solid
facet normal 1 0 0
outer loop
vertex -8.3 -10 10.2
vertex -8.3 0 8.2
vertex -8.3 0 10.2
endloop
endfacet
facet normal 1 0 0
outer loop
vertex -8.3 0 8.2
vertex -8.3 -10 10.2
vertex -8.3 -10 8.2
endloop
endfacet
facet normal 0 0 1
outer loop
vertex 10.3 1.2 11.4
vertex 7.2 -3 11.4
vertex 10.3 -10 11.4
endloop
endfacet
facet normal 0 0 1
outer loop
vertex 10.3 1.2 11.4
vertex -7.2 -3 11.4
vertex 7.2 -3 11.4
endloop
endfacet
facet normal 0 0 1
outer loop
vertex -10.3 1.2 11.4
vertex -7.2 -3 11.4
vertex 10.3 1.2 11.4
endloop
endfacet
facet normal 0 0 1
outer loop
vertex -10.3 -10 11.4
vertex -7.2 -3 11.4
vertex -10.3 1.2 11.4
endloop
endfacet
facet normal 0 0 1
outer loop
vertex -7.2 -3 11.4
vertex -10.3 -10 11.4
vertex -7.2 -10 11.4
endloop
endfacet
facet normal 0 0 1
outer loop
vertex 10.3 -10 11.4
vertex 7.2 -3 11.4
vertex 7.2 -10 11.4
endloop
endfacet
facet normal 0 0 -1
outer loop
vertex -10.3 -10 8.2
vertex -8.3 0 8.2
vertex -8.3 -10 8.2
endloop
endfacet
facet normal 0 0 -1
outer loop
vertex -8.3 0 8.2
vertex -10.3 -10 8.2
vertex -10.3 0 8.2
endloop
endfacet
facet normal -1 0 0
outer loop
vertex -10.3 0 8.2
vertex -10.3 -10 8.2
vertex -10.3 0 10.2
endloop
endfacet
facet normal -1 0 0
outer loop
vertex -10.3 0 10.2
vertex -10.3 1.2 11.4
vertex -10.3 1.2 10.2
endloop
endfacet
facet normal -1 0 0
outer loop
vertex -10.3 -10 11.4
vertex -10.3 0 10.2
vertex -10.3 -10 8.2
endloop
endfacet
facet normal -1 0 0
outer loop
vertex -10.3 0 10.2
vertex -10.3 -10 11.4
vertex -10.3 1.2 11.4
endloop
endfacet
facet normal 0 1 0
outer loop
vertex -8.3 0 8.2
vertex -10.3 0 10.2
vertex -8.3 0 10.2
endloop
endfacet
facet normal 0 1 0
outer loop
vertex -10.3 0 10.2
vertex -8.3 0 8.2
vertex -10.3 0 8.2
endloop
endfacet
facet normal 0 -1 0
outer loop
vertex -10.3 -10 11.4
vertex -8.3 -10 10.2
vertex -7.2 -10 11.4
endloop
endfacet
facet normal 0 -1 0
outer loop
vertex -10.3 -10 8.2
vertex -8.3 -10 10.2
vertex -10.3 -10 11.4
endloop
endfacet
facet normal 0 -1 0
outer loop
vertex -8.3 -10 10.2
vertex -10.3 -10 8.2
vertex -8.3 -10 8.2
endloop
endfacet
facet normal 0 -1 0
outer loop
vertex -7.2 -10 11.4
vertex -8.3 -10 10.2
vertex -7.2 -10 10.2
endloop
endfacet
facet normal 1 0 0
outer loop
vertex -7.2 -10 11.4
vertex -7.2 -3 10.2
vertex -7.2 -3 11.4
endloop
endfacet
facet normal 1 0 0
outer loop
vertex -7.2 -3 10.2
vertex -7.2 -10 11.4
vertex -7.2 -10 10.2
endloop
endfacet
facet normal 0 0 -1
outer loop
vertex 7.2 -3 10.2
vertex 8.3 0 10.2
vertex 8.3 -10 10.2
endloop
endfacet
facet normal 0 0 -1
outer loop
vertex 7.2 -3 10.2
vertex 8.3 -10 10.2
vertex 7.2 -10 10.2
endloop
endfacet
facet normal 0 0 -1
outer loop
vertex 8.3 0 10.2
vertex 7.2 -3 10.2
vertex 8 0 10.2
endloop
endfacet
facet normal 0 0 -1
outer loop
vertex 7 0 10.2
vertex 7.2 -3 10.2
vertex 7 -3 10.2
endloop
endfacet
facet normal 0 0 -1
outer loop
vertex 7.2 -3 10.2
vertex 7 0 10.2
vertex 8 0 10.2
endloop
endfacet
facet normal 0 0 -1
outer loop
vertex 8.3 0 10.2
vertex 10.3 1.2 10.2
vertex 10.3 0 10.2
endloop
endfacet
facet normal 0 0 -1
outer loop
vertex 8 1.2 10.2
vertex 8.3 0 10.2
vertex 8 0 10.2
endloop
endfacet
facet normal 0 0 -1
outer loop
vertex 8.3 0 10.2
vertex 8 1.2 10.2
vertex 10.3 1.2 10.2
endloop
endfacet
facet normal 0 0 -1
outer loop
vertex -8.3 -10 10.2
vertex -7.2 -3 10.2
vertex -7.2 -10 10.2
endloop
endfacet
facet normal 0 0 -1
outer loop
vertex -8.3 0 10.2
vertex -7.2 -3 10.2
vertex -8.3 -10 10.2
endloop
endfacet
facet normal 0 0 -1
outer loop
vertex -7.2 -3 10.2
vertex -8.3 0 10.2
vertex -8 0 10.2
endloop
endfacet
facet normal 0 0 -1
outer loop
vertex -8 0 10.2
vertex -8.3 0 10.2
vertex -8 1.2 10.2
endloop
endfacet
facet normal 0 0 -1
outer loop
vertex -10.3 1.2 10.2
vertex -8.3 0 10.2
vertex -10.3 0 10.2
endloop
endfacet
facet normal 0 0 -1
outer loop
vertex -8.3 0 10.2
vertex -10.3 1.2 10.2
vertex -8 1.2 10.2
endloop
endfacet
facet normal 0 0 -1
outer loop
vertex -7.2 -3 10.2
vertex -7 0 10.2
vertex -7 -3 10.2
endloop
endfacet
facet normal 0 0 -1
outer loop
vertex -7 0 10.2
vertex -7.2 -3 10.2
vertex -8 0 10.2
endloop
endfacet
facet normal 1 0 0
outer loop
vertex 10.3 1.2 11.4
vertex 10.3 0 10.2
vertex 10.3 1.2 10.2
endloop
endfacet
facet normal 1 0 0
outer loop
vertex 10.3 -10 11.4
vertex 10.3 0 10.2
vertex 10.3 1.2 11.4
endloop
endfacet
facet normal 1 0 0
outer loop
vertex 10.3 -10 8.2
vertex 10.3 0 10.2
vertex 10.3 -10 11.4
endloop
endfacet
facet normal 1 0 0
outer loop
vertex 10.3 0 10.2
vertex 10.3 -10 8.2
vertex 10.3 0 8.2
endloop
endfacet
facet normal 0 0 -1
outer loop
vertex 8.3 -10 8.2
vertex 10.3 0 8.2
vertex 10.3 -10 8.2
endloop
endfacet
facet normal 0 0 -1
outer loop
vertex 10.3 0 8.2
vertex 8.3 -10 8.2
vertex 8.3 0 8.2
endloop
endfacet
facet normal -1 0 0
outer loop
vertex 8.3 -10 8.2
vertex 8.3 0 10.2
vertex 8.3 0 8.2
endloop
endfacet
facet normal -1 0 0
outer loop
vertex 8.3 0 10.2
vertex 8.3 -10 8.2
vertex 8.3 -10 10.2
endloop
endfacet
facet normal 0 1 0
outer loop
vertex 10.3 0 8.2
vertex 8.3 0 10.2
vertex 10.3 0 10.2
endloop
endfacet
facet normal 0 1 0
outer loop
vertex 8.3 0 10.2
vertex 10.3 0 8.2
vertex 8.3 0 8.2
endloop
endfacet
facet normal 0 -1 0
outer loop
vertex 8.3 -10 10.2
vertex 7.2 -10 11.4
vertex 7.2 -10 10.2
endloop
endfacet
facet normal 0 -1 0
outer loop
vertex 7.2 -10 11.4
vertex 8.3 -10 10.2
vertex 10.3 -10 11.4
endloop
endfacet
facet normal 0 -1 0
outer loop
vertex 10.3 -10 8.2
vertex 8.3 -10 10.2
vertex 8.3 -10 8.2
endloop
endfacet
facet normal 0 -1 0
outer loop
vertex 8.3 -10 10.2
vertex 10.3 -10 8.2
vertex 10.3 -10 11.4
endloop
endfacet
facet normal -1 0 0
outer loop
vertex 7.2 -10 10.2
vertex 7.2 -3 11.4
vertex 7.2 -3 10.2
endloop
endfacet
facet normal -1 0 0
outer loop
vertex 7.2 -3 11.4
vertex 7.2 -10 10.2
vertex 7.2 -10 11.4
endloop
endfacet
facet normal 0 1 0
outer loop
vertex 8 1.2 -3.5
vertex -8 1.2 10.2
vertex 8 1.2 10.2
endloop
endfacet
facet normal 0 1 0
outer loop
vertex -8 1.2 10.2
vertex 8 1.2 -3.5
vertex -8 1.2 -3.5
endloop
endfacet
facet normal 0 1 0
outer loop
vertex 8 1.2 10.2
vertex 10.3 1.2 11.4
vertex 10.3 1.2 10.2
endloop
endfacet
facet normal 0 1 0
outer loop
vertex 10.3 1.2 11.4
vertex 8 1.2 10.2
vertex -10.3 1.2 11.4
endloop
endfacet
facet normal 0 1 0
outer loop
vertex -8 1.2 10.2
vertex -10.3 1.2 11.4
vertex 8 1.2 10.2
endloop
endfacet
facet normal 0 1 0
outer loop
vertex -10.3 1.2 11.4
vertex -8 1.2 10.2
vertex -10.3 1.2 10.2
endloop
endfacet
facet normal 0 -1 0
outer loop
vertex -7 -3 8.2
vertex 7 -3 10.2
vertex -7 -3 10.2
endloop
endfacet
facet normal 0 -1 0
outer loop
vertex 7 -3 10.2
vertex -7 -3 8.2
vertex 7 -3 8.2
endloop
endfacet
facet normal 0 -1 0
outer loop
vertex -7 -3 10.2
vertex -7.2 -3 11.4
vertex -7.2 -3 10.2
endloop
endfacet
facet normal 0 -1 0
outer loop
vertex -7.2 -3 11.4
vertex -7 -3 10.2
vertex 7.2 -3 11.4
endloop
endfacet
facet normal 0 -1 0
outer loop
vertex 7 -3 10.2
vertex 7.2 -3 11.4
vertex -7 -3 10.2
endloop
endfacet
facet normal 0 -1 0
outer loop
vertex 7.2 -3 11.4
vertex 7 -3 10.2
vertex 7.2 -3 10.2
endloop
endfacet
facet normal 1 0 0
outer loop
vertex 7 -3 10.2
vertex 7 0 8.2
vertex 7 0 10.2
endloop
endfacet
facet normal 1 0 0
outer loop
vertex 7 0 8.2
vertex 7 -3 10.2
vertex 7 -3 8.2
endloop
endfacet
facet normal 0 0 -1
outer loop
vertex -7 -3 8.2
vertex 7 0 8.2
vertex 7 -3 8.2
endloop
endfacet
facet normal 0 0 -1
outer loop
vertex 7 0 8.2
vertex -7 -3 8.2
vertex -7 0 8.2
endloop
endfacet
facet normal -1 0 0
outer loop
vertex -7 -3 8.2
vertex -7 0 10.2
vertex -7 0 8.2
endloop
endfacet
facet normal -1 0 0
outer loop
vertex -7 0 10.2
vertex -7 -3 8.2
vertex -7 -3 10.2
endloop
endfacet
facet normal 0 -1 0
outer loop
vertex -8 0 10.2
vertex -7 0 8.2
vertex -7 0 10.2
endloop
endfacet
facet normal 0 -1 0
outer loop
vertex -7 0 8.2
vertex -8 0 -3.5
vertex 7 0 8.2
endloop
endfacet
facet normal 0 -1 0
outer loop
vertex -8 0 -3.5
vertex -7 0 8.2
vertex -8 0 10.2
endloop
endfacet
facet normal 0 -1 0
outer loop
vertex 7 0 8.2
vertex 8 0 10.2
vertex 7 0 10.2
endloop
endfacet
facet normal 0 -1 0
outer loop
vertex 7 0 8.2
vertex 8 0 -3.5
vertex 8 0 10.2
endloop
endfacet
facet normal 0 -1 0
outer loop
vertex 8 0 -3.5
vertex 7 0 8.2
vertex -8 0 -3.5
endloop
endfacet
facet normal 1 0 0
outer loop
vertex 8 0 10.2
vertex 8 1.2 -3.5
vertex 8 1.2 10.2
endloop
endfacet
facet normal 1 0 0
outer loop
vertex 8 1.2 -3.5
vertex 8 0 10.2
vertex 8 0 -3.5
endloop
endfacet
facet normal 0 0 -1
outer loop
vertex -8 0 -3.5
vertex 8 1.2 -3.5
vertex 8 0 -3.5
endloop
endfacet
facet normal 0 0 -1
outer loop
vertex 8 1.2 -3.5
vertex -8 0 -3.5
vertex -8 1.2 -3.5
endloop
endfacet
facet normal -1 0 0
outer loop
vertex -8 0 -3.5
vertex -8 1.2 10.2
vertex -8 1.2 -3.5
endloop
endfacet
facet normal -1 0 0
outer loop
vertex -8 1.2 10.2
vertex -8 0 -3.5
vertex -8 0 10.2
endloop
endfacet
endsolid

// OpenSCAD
// ReachSense six-finger wrap v2. Units: mm. Experimental, physically unverified.
// R: +X lateral, +Y distal (towards fingertip), +Z dorsal.
// A REMOVABLE seating gauge defines Y=0. The wearable deck ends at Y=-3.
// Remove the gauge before testing; no permanent wall blocks the fingertip.
// This defines nominal longitudinal registration, NOT an anatomical 3D point.
$fn = 48;
part = "gauge"; // "holder", "gauge" or "strap"
marker_id = 23;
finger_diameter_mm = 14;
marker_edge_mm = 10;
quiet_zone_mm = 2;
frame_mm = 1;
wall_mm = 2;
stop_wall_mm = 1.2;
strap_width_mm = 6;
strap_length_mm = 90;
gauge_side_clearance_mm = 0.3;
r = finger_diameter_mm/2;
tile = marker_edge_mm + 2*quiet_zone_mm;
deck_width = tile + 2*frame_mm;
length = tile + 2*frame_mm + 8;
deck_front_y = -3;
deck_back_y = deck_front_y-length;
deck_bottom = r + wall_mm - 0.8;
deck_top = deck_bottom + 2;
pocket_depth = 0.2;
marker_y = deck_front_y-(frame_mm+quiet_zone_mm+marker_edge_mm/2);
support_y = [deck_front_y-5,deck_back_y+5];
nail_seat_width = min(8,finger_diameter_mm/2);
nail_seat_z = r-0.6;
assert(finger_diameter_mm >= 12 && finger_diameter_mm <= 26,"Choose a 12–26 mm candidate opening");
assert(marker_edge_mm >= 8 && marker_edge_mm <= 16,"Choose an 8–16 mm black edge");
assert(quiet_zone_mm >= 2,"Keep the full white quiet zone");
assert(marker_id >= 0 && marker_id < 100,"DICT_4X4_100 ID required");
module support(y) {
    translate([0,y,0]) intersection() {
        difference() {
            rotate([90,0,0]) cylinder(r=r+wall_mm,h=6.8,center=true);
            rotate([90,0,0]) cylinder(r=r,h=8.8,center=true);
        }
        translate([-r-wall_mm-1,-4.4,0]) cube([2*(r+wall_mm+1),8.8,r+wall_mm+1]);
    }
    // Flat dorsal bearing at each strap region closes the gap below the deck.
    // Contact with a real nail/dorsal surface and rotational retention are unverified.
    translate([-nail_seat_width/2,y-1.5,nail_seat_z])
        cube([nail_seat_width,3,deck_bottom-nail_seat_z+0.2]);
    for(sign=[-1,1]) translate([sign*(r+wall_mm+2.1),y,1.5]) difference() {
        cube([6,8.8,3],center=true);
        cube([2.6,6.4,5],center=true);
    }
}
module deck() {
    // Rounded corners retain a straight central gauge abutment at Y=-3.
    hull() for(x=[-deck_width/2+1,deck_width/2-1])
        for(y=[deck_back_y+1,deck_front_y-1])
            translate([x,y,deck_bottom]) cylinder(r=1,h=2);
}
module holder() {
    difference() {
        union() { for(y=support_y) support(y); deck(); }
        translate([-tile/2-0.1,marker_y-tile/2-0.1,deck_top-pocket_depth])
            cube([tile+0.2,tile+0.2,pocket_depth+1]);
    }
}
module gauge() {
    // Hand-held drop-on gauge, NOT a validated snap fit. Hold its proximal
    // abutment against the deck's front face at Y=-3 while gently seating the finger.
    // Feet sit on the bare side frame; the ArUco pocket remains clear.
    union() {
        translate([-deck_width/2-2.3,deck_front_y,deck_top])
            cube([deck_width+4.6,-deck_front_y+stop_wall_mm,1.2]);
        // Deck contact Y=-3; fingertip contact Y=0. Remove upwards after tightening.
        translate([-deck_width/2+1,deck_front_y,deck_bottom])
            cube([deck_width-2,-deck_front_y,deck_top-deck_bottom+0.5]);
        translate([-deck_width/2,0,-r/2])
            cube([deck_width,stop_wall_mm,deck_top+1.2+r/2]);
        for(sign=[-1,1]) {
            x=sign>0 ? deck_width/2+gauge_side_clearance_mm : -deck_width/2-gauge_side_clearance_mm-2;
            translate([x,-10,deck_bottom]) cube([2,10,deck_top-deck_bottom+1.2]);
            foot_x=sign>0 ? deck_width/2-0.8 : -deck_width/2-2.3;
            translate([foot_x,-10,deck_top]) cube([3.1,10,1.2]);
        }
    }
}
module strap() {
    // TPU-only ladder strip. Ends require a return loop/fastener or hook-and-loop.
    union() {
        translate([-strap_length_mm/2,-strap_width_mm/2,0]) cube([strap_length_mm,strap_width_mm,0.8]);
        for(x=[-strap_length_mm/2+3:4:strap_length_mm/2-3])
            translate([x-0.7,-strap_width_mm/2,0.8]) cube([1.4,strap_width_mm,0.5]);
    }
}
if(part=="strap") strap(); else if(part=="gauge") gauge(); else holder();
echo(reference_plane_y_mm=0,deck_front_y_mm=deck_front_y);
echo(marker_center_R_mm=[0,marker_y,deck_top-pocket_depth+0.15]);
echo(marker_center_to_reference_plane_mm=-marker_y);
